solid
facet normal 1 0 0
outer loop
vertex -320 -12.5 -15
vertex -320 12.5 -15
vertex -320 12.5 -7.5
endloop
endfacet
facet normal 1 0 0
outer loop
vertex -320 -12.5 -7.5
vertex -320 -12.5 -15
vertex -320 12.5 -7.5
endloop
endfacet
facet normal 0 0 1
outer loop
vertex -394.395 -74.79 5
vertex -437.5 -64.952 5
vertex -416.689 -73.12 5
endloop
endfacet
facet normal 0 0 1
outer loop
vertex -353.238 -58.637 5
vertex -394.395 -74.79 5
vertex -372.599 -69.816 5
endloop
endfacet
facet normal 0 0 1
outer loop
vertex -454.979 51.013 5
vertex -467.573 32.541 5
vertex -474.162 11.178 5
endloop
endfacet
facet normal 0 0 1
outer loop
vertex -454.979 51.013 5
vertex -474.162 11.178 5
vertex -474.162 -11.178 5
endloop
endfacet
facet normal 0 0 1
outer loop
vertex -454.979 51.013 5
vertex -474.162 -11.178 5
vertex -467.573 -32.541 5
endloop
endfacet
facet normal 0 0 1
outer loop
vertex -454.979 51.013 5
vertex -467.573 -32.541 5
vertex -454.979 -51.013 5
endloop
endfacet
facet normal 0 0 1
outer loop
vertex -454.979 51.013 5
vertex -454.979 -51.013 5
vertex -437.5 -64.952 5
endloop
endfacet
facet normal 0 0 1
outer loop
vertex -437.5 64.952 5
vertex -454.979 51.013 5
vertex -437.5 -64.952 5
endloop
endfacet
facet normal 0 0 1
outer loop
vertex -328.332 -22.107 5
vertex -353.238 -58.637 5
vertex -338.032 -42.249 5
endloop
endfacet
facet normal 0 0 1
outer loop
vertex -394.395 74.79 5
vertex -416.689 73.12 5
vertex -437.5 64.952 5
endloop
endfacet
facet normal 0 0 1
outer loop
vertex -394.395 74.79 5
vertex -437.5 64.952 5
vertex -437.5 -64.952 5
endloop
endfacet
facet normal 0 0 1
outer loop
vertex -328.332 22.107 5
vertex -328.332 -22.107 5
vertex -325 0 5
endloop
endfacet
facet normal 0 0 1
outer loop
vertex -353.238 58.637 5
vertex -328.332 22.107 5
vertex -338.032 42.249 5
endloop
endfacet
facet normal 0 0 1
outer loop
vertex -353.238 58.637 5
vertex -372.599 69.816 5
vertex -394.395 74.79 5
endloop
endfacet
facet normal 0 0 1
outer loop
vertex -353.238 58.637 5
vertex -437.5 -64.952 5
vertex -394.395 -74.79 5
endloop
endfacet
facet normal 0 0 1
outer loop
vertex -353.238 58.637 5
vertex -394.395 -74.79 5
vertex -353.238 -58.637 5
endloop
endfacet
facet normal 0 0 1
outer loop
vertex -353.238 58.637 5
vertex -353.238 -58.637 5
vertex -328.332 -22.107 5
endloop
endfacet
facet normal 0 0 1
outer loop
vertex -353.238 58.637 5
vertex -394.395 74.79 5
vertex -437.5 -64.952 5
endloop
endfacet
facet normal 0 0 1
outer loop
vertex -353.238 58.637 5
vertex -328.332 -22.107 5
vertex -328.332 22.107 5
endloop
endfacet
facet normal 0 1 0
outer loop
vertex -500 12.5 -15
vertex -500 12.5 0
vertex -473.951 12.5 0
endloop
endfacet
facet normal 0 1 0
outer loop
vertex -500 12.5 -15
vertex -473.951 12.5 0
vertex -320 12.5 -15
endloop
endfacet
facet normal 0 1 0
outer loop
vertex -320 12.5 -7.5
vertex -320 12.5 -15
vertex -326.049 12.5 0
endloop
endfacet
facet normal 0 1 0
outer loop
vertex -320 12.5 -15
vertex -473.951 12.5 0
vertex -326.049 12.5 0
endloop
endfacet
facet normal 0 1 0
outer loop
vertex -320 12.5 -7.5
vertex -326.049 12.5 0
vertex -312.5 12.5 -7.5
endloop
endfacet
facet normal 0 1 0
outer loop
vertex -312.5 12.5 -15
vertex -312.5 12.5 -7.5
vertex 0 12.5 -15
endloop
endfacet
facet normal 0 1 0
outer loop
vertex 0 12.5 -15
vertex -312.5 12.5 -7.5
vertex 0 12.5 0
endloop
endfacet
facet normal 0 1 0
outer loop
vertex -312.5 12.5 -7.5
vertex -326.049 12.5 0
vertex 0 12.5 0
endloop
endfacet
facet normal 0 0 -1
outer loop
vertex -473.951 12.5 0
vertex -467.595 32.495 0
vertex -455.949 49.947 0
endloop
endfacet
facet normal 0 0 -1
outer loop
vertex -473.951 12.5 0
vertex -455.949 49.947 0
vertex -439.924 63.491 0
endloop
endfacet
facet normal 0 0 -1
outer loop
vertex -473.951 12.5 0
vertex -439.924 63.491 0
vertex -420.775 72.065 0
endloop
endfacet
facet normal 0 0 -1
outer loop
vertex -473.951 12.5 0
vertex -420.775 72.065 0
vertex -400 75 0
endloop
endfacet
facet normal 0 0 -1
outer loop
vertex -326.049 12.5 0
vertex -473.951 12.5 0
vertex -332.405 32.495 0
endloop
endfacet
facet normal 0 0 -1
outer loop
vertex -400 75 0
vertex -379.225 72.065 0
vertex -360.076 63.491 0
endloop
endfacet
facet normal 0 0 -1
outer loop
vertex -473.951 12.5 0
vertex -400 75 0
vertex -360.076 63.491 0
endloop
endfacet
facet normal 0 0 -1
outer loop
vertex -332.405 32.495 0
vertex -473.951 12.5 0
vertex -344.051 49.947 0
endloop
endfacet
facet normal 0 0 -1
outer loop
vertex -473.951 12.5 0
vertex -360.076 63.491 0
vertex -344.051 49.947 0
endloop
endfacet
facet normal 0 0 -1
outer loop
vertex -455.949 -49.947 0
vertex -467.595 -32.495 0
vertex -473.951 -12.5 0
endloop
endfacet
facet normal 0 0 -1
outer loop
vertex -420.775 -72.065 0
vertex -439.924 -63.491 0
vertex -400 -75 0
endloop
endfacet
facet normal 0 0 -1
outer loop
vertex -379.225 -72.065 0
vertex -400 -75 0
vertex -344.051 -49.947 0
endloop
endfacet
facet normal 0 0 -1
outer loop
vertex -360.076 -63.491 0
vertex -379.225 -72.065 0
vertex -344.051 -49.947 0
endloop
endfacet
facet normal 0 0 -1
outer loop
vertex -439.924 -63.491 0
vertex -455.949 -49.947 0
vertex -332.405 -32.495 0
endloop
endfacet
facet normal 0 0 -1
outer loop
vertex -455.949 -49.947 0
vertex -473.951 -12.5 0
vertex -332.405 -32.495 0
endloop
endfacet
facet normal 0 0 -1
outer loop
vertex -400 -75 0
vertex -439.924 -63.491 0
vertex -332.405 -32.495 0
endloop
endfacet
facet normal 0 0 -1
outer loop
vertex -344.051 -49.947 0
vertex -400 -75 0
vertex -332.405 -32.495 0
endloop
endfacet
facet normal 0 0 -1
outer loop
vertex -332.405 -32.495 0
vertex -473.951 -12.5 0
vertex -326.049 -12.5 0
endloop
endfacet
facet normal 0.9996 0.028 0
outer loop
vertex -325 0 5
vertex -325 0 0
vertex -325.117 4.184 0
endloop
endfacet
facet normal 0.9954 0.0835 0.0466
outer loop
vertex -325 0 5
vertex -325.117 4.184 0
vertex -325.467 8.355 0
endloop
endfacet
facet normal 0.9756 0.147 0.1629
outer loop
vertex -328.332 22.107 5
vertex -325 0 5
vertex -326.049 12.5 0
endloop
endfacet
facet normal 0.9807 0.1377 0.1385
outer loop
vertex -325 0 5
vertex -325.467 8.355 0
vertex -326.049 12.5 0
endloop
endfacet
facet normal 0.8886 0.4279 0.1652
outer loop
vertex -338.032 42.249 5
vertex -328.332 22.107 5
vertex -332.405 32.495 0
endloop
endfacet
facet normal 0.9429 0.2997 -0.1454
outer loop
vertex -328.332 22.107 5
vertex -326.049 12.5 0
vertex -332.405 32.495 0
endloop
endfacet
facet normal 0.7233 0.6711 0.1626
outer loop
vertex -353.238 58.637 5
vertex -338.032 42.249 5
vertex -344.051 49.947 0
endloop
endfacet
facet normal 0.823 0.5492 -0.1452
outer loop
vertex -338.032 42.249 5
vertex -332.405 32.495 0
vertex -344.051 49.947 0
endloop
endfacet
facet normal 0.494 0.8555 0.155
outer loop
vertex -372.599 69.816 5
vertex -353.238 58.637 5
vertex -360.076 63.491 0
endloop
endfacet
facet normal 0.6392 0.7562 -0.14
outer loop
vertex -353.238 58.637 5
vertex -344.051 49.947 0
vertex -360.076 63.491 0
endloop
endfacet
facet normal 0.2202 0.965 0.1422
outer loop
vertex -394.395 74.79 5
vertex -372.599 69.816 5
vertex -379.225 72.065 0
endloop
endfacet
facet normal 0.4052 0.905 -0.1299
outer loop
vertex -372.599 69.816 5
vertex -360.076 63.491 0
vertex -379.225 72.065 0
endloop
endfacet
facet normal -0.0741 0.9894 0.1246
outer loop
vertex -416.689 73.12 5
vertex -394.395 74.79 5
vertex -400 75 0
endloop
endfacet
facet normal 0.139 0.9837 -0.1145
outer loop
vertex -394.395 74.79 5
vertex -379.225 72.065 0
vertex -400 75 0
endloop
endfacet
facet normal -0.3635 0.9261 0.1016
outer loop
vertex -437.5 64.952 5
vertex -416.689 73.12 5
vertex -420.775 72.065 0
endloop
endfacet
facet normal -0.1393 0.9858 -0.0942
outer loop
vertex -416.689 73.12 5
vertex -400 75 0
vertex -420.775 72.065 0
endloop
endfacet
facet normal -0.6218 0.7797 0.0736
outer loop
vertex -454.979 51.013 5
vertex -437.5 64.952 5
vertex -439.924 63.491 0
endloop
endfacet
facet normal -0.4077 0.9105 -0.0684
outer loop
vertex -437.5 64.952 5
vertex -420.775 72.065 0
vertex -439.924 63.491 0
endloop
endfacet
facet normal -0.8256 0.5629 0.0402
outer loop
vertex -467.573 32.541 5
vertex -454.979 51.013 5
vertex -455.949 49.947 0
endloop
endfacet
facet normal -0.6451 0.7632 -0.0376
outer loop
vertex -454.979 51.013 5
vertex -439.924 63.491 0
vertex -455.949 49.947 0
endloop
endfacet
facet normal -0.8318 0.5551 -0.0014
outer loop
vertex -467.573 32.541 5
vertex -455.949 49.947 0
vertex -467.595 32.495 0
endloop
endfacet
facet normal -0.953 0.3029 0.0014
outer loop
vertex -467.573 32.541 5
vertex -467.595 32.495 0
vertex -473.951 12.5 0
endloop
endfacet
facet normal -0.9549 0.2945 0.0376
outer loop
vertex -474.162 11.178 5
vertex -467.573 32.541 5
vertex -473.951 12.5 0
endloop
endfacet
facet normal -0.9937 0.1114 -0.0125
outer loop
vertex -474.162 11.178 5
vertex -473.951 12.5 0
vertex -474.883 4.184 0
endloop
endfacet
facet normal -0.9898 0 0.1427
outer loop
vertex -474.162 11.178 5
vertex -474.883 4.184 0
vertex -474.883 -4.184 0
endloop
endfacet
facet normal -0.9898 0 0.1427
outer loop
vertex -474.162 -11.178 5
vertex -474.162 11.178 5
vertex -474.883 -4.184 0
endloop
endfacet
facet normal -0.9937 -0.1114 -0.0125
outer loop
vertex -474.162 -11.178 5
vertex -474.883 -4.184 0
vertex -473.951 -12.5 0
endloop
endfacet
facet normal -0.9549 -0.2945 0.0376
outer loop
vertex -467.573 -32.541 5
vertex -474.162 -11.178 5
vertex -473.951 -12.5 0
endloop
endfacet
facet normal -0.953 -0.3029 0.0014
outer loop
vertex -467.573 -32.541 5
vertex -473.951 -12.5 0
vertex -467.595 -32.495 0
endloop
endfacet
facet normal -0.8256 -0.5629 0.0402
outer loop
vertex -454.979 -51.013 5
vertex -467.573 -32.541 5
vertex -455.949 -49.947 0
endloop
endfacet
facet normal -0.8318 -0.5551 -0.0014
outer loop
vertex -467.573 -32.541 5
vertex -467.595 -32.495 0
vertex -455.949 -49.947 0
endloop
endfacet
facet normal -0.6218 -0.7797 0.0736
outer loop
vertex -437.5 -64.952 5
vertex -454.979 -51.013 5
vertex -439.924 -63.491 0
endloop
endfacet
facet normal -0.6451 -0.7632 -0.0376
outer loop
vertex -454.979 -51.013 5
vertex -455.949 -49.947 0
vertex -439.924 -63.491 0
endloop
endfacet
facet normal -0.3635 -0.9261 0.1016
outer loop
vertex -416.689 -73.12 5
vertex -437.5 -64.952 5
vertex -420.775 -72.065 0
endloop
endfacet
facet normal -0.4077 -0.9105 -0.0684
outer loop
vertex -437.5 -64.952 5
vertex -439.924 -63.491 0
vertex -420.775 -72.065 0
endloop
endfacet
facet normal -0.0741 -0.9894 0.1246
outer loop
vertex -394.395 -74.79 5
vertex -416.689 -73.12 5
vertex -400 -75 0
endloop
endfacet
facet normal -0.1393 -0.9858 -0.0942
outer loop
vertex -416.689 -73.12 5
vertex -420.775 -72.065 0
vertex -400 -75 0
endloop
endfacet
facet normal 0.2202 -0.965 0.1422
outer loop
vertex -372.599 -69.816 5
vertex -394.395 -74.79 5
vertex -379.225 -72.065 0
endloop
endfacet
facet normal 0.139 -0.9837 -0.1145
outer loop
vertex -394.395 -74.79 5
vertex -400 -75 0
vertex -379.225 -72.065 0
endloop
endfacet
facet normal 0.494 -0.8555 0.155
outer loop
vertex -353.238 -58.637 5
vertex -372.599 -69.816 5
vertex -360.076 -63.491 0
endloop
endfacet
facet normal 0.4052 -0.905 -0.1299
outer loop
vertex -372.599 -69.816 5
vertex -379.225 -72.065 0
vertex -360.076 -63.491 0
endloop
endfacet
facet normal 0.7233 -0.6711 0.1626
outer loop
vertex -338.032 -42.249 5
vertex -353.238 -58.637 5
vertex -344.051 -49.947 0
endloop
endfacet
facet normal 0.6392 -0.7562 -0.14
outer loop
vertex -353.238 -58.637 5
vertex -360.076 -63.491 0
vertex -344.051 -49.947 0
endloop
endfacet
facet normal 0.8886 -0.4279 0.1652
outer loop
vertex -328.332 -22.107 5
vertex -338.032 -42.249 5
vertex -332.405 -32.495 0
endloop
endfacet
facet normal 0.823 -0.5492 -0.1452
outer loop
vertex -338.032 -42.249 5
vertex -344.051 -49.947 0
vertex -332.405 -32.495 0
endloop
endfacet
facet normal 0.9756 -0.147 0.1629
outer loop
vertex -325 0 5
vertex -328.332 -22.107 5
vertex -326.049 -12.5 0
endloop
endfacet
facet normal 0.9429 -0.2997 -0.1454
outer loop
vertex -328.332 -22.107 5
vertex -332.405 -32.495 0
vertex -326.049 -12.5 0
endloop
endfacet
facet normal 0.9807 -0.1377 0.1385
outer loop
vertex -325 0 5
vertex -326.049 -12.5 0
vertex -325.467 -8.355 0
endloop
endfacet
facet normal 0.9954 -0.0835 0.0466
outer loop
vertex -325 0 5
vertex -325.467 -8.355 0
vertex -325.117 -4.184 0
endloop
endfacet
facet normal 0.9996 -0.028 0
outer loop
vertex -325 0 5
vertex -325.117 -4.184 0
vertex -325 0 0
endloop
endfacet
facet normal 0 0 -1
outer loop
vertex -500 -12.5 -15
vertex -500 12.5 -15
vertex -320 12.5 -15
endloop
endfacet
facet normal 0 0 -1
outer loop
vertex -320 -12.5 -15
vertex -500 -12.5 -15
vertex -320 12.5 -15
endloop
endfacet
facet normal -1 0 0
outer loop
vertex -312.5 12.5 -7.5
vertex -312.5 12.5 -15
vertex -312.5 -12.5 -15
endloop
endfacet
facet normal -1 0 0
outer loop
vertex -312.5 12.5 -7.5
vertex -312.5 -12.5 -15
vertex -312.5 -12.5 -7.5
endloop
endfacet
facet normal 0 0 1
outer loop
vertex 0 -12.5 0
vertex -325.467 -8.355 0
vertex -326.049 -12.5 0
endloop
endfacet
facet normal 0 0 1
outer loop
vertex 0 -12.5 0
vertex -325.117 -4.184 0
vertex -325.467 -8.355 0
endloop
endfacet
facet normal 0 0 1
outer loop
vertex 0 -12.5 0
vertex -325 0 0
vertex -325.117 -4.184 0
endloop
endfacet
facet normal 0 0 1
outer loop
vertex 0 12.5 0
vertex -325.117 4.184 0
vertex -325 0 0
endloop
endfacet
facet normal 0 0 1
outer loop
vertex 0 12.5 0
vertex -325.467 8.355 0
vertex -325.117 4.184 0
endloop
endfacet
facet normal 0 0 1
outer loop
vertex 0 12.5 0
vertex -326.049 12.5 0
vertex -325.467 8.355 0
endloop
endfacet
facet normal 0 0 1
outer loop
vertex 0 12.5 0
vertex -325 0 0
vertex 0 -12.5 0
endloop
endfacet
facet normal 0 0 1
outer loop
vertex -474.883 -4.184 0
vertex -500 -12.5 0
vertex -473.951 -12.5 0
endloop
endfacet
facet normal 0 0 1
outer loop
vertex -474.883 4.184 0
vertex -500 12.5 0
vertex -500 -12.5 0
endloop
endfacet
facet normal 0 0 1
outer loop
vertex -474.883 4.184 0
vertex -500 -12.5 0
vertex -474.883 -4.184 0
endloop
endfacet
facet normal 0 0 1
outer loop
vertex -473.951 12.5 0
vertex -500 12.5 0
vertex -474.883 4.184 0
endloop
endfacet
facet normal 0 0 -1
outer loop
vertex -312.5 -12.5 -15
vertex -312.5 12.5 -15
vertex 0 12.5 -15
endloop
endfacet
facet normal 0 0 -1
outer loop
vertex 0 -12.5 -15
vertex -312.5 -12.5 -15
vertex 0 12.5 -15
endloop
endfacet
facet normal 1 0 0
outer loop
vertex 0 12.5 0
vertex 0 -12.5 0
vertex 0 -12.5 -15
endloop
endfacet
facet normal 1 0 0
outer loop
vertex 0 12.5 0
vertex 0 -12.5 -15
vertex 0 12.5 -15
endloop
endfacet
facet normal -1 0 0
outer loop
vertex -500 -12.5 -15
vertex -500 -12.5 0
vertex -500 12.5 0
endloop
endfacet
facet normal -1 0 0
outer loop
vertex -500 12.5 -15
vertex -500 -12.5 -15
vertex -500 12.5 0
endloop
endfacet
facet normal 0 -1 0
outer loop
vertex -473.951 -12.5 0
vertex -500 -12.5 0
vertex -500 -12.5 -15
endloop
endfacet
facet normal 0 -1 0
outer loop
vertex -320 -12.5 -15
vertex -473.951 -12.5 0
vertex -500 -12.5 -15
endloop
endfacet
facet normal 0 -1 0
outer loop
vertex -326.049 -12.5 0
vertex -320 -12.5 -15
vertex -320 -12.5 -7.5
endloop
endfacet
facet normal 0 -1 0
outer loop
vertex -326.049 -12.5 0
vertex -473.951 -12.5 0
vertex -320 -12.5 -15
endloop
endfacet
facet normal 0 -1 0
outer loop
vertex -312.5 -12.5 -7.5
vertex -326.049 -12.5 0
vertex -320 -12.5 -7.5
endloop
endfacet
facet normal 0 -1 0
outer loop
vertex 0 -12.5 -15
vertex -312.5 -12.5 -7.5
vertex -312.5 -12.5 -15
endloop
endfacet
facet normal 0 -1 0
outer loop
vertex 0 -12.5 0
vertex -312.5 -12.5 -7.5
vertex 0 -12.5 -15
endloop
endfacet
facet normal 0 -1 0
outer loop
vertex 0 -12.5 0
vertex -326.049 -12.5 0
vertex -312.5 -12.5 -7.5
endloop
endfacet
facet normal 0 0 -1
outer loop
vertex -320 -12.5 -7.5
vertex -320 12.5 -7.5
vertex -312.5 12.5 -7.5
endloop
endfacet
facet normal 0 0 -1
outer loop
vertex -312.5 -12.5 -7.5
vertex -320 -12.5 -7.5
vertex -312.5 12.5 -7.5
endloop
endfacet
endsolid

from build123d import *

# Parameters (mm, degrees)
F0_W     = 500
F0_H     = 25
F1_DEPTH = 15
F2_R     = 75
F3_DEPTH = 5
F4_W     = 7.5
F4_H     = 7.5
F5_DEPTH = 12.5


with BuildPart() as f1:
    # F0 (on Top) → F1 (new body)
    with BuildSketch(Plane.XY):
        with Locations((-250, 0)):
            Rectangle(F0_W, F0_H)
    extrude(amount=-F1_DEPTH)

    # F2 (on Top) → F3 (join)
    with BuildSketch(Plane.XY):
        with Locations((-400, 0)):
            Circle(F2_R)
    extrude(amount=F3_DEPTH)

    # F4 (on Front) → F5 (cut, symmetric)
    with BuildSketch(Plane.XZ):
        with Locations((-316.25, -11.25)):
            Rectangle(F4_W, F4_H)
    extrude(amount=F5_DEPTH, both=True, mode=Mode.SUBTRACT)


solid = f1.part
